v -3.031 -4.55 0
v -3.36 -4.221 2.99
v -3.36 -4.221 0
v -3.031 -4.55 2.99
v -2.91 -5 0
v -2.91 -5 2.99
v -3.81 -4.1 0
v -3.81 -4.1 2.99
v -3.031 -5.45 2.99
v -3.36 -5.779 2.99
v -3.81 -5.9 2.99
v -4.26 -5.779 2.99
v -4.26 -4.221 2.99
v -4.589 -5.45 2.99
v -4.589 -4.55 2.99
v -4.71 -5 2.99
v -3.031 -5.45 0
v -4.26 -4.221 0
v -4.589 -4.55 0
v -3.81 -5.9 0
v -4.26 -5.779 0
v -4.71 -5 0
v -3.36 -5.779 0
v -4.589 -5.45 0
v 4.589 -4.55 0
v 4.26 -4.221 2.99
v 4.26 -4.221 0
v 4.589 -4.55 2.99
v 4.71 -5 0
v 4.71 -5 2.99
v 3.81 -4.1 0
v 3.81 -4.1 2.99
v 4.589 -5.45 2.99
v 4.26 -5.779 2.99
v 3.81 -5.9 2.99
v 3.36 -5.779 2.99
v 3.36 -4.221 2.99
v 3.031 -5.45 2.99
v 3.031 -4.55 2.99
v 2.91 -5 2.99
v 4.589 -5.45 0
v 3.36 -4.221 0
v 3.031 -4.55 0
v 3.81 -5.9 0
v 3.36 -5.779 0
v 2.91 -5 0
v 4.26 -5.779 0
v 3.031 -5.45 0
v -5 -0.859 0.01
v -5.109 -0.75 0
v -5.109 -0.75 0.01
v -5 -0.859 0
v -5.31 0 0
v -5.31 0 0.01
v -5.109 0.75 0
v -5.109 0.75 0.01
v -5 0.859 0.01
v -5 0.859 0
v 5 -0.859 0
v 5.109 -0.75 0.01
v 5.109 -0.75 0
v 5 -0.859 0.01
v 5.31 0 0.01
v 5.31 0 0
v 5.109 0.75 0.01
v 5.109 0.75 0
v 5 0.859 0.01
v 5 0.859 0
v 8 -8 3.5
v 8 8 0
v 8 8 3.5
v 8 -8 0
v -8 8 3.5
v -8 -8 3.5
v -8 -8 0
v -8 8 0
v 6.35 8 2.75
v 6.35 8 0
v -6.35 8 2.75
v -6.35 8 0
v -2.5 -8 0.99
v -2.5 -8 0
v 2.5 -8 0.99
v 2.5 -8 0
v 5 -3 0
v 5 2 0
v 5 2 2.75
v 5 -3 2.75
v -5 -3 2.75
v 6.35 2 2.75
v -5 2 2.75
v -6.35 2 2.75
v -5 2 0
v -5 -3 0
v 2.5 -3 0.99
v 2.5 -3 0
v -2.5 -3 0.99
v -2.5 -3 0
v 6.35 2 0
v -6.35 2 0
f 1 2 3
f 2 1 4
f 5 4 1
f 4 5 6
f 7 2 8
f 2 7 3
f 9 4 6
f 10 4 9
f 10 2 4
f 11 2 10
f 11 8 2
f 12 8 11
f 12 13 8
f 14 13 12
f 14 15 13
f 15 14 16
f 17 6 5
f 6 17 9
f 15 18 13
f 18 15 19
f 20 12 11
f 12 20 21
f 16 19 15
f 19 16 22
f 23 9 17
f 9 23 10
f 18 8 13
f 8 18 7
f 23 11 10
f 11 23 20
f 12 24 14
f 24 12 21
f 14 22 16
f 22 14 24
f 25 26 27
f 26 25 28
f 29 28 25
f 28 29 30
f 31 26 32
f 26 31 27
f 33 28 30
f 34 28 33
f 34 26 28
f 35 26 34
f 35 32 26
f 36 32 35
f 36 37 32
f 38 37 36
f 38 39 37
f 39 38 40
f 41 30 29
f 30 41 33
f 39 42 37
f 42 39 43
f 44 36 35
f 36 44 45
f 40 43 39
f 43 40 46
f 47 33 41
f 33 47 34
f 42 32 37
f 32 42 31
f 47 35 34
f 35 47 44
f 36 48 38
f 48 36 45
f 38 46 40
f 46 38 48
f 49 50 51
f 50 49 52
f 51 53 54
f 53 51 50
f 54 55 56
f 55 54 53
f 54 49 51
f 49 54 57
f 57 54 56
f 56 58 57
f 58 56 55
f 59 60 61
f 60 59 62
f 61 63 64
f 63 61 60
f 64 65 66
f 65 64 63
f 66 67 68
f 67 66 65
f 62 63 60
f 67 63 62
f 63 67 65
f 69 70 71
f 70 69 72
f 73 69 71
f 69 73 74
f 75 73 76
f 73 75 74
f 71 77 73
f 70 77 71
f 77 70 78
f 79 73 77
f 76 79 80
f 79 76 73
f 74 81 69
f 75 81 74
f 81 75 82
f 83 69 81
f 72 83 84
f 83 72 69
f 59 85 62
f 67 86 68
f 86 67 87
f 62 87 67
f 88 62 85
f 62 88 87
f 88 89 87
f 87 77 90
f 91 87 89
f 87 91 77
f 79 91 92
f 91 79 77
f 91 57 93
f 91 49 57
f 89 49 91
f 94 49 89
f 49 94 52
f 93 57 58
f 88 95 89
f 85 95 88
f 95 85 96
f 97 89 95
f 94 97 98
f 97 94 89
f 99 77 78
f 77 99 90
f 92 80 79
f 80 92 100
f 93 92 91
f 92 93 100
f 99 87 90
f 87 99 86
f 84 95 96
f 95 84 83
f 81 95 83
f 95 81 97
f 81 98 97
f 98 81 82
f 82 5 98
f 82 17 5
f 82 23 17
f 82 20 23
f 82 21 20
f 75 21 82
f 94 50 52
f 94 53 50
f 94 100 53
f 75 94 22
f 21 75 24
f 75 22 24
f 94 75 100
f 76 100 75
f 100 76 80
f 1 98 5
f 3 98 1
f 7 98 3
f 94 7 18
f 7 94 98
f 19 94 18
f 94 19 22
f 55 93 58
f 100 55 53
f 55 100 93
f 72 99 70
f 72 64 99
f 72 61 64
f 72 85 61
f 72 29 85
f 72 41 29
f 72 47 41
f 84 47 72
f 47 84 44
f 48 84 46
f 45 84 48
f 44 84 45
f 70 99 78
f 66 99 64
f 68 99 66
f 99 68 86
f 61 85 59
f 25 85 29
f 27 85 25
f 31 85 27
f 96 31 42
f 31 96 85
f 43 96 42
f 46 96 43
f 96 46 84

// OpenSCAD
// mechanical protection
// for improvised plug to SKR 1.3 board

module inside_hole()
{
  cube([10,6,5.5],center=true);
}

module connector_holder()
{
  cube([16,16,7],center=true);
}

/*
module motor_wire_space()
{
  translate([0,11,0])
  cube([6.5,10,1.4],center=true);
}
*/

module solder_space()
{
  translate([0,7,0])
  cube([5*2.54,10,5.5],center=true);
}

module board_wire_space()
{
  translate([0,-6,0.5-0.01])
  cube([5,9,1.0],center=true);
}

module screw_in()
{
  for(i = [-1,1])
    translate([3*2.54/2*i,-5,-0.01])
      cylinder(d=1.8,h=3,$fn=12);
}

module screw_thru()
{
  for(i = [-1,1])
    translate([3*2.54/2*i,0,0.01])
      rotate([180,0,0])
        cylinder(d=3,h=10,$fn=12);
}

module motor_wire_holder(half=1)
{
  difference()
  {
    connector_holder();
    inside_hole();
    solder_space();
    board_wire_space();
    screw_in();
    screw_thru();
    translate([0,0,-50*half])
      cube([50,50,100],center=true);
  }
}

motor_wire_holder(half=1);
